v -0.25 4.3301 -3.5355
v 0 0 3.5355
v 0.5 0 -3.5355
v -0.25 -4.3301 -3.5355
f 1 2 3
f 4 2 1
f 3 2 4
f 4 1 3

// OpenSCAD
$fn = 3;
scale(v = [0.1, 1, 1])
	cylinder(h = sqrt(2) * 5, r1 = 5, r2 = 0, center = true);
